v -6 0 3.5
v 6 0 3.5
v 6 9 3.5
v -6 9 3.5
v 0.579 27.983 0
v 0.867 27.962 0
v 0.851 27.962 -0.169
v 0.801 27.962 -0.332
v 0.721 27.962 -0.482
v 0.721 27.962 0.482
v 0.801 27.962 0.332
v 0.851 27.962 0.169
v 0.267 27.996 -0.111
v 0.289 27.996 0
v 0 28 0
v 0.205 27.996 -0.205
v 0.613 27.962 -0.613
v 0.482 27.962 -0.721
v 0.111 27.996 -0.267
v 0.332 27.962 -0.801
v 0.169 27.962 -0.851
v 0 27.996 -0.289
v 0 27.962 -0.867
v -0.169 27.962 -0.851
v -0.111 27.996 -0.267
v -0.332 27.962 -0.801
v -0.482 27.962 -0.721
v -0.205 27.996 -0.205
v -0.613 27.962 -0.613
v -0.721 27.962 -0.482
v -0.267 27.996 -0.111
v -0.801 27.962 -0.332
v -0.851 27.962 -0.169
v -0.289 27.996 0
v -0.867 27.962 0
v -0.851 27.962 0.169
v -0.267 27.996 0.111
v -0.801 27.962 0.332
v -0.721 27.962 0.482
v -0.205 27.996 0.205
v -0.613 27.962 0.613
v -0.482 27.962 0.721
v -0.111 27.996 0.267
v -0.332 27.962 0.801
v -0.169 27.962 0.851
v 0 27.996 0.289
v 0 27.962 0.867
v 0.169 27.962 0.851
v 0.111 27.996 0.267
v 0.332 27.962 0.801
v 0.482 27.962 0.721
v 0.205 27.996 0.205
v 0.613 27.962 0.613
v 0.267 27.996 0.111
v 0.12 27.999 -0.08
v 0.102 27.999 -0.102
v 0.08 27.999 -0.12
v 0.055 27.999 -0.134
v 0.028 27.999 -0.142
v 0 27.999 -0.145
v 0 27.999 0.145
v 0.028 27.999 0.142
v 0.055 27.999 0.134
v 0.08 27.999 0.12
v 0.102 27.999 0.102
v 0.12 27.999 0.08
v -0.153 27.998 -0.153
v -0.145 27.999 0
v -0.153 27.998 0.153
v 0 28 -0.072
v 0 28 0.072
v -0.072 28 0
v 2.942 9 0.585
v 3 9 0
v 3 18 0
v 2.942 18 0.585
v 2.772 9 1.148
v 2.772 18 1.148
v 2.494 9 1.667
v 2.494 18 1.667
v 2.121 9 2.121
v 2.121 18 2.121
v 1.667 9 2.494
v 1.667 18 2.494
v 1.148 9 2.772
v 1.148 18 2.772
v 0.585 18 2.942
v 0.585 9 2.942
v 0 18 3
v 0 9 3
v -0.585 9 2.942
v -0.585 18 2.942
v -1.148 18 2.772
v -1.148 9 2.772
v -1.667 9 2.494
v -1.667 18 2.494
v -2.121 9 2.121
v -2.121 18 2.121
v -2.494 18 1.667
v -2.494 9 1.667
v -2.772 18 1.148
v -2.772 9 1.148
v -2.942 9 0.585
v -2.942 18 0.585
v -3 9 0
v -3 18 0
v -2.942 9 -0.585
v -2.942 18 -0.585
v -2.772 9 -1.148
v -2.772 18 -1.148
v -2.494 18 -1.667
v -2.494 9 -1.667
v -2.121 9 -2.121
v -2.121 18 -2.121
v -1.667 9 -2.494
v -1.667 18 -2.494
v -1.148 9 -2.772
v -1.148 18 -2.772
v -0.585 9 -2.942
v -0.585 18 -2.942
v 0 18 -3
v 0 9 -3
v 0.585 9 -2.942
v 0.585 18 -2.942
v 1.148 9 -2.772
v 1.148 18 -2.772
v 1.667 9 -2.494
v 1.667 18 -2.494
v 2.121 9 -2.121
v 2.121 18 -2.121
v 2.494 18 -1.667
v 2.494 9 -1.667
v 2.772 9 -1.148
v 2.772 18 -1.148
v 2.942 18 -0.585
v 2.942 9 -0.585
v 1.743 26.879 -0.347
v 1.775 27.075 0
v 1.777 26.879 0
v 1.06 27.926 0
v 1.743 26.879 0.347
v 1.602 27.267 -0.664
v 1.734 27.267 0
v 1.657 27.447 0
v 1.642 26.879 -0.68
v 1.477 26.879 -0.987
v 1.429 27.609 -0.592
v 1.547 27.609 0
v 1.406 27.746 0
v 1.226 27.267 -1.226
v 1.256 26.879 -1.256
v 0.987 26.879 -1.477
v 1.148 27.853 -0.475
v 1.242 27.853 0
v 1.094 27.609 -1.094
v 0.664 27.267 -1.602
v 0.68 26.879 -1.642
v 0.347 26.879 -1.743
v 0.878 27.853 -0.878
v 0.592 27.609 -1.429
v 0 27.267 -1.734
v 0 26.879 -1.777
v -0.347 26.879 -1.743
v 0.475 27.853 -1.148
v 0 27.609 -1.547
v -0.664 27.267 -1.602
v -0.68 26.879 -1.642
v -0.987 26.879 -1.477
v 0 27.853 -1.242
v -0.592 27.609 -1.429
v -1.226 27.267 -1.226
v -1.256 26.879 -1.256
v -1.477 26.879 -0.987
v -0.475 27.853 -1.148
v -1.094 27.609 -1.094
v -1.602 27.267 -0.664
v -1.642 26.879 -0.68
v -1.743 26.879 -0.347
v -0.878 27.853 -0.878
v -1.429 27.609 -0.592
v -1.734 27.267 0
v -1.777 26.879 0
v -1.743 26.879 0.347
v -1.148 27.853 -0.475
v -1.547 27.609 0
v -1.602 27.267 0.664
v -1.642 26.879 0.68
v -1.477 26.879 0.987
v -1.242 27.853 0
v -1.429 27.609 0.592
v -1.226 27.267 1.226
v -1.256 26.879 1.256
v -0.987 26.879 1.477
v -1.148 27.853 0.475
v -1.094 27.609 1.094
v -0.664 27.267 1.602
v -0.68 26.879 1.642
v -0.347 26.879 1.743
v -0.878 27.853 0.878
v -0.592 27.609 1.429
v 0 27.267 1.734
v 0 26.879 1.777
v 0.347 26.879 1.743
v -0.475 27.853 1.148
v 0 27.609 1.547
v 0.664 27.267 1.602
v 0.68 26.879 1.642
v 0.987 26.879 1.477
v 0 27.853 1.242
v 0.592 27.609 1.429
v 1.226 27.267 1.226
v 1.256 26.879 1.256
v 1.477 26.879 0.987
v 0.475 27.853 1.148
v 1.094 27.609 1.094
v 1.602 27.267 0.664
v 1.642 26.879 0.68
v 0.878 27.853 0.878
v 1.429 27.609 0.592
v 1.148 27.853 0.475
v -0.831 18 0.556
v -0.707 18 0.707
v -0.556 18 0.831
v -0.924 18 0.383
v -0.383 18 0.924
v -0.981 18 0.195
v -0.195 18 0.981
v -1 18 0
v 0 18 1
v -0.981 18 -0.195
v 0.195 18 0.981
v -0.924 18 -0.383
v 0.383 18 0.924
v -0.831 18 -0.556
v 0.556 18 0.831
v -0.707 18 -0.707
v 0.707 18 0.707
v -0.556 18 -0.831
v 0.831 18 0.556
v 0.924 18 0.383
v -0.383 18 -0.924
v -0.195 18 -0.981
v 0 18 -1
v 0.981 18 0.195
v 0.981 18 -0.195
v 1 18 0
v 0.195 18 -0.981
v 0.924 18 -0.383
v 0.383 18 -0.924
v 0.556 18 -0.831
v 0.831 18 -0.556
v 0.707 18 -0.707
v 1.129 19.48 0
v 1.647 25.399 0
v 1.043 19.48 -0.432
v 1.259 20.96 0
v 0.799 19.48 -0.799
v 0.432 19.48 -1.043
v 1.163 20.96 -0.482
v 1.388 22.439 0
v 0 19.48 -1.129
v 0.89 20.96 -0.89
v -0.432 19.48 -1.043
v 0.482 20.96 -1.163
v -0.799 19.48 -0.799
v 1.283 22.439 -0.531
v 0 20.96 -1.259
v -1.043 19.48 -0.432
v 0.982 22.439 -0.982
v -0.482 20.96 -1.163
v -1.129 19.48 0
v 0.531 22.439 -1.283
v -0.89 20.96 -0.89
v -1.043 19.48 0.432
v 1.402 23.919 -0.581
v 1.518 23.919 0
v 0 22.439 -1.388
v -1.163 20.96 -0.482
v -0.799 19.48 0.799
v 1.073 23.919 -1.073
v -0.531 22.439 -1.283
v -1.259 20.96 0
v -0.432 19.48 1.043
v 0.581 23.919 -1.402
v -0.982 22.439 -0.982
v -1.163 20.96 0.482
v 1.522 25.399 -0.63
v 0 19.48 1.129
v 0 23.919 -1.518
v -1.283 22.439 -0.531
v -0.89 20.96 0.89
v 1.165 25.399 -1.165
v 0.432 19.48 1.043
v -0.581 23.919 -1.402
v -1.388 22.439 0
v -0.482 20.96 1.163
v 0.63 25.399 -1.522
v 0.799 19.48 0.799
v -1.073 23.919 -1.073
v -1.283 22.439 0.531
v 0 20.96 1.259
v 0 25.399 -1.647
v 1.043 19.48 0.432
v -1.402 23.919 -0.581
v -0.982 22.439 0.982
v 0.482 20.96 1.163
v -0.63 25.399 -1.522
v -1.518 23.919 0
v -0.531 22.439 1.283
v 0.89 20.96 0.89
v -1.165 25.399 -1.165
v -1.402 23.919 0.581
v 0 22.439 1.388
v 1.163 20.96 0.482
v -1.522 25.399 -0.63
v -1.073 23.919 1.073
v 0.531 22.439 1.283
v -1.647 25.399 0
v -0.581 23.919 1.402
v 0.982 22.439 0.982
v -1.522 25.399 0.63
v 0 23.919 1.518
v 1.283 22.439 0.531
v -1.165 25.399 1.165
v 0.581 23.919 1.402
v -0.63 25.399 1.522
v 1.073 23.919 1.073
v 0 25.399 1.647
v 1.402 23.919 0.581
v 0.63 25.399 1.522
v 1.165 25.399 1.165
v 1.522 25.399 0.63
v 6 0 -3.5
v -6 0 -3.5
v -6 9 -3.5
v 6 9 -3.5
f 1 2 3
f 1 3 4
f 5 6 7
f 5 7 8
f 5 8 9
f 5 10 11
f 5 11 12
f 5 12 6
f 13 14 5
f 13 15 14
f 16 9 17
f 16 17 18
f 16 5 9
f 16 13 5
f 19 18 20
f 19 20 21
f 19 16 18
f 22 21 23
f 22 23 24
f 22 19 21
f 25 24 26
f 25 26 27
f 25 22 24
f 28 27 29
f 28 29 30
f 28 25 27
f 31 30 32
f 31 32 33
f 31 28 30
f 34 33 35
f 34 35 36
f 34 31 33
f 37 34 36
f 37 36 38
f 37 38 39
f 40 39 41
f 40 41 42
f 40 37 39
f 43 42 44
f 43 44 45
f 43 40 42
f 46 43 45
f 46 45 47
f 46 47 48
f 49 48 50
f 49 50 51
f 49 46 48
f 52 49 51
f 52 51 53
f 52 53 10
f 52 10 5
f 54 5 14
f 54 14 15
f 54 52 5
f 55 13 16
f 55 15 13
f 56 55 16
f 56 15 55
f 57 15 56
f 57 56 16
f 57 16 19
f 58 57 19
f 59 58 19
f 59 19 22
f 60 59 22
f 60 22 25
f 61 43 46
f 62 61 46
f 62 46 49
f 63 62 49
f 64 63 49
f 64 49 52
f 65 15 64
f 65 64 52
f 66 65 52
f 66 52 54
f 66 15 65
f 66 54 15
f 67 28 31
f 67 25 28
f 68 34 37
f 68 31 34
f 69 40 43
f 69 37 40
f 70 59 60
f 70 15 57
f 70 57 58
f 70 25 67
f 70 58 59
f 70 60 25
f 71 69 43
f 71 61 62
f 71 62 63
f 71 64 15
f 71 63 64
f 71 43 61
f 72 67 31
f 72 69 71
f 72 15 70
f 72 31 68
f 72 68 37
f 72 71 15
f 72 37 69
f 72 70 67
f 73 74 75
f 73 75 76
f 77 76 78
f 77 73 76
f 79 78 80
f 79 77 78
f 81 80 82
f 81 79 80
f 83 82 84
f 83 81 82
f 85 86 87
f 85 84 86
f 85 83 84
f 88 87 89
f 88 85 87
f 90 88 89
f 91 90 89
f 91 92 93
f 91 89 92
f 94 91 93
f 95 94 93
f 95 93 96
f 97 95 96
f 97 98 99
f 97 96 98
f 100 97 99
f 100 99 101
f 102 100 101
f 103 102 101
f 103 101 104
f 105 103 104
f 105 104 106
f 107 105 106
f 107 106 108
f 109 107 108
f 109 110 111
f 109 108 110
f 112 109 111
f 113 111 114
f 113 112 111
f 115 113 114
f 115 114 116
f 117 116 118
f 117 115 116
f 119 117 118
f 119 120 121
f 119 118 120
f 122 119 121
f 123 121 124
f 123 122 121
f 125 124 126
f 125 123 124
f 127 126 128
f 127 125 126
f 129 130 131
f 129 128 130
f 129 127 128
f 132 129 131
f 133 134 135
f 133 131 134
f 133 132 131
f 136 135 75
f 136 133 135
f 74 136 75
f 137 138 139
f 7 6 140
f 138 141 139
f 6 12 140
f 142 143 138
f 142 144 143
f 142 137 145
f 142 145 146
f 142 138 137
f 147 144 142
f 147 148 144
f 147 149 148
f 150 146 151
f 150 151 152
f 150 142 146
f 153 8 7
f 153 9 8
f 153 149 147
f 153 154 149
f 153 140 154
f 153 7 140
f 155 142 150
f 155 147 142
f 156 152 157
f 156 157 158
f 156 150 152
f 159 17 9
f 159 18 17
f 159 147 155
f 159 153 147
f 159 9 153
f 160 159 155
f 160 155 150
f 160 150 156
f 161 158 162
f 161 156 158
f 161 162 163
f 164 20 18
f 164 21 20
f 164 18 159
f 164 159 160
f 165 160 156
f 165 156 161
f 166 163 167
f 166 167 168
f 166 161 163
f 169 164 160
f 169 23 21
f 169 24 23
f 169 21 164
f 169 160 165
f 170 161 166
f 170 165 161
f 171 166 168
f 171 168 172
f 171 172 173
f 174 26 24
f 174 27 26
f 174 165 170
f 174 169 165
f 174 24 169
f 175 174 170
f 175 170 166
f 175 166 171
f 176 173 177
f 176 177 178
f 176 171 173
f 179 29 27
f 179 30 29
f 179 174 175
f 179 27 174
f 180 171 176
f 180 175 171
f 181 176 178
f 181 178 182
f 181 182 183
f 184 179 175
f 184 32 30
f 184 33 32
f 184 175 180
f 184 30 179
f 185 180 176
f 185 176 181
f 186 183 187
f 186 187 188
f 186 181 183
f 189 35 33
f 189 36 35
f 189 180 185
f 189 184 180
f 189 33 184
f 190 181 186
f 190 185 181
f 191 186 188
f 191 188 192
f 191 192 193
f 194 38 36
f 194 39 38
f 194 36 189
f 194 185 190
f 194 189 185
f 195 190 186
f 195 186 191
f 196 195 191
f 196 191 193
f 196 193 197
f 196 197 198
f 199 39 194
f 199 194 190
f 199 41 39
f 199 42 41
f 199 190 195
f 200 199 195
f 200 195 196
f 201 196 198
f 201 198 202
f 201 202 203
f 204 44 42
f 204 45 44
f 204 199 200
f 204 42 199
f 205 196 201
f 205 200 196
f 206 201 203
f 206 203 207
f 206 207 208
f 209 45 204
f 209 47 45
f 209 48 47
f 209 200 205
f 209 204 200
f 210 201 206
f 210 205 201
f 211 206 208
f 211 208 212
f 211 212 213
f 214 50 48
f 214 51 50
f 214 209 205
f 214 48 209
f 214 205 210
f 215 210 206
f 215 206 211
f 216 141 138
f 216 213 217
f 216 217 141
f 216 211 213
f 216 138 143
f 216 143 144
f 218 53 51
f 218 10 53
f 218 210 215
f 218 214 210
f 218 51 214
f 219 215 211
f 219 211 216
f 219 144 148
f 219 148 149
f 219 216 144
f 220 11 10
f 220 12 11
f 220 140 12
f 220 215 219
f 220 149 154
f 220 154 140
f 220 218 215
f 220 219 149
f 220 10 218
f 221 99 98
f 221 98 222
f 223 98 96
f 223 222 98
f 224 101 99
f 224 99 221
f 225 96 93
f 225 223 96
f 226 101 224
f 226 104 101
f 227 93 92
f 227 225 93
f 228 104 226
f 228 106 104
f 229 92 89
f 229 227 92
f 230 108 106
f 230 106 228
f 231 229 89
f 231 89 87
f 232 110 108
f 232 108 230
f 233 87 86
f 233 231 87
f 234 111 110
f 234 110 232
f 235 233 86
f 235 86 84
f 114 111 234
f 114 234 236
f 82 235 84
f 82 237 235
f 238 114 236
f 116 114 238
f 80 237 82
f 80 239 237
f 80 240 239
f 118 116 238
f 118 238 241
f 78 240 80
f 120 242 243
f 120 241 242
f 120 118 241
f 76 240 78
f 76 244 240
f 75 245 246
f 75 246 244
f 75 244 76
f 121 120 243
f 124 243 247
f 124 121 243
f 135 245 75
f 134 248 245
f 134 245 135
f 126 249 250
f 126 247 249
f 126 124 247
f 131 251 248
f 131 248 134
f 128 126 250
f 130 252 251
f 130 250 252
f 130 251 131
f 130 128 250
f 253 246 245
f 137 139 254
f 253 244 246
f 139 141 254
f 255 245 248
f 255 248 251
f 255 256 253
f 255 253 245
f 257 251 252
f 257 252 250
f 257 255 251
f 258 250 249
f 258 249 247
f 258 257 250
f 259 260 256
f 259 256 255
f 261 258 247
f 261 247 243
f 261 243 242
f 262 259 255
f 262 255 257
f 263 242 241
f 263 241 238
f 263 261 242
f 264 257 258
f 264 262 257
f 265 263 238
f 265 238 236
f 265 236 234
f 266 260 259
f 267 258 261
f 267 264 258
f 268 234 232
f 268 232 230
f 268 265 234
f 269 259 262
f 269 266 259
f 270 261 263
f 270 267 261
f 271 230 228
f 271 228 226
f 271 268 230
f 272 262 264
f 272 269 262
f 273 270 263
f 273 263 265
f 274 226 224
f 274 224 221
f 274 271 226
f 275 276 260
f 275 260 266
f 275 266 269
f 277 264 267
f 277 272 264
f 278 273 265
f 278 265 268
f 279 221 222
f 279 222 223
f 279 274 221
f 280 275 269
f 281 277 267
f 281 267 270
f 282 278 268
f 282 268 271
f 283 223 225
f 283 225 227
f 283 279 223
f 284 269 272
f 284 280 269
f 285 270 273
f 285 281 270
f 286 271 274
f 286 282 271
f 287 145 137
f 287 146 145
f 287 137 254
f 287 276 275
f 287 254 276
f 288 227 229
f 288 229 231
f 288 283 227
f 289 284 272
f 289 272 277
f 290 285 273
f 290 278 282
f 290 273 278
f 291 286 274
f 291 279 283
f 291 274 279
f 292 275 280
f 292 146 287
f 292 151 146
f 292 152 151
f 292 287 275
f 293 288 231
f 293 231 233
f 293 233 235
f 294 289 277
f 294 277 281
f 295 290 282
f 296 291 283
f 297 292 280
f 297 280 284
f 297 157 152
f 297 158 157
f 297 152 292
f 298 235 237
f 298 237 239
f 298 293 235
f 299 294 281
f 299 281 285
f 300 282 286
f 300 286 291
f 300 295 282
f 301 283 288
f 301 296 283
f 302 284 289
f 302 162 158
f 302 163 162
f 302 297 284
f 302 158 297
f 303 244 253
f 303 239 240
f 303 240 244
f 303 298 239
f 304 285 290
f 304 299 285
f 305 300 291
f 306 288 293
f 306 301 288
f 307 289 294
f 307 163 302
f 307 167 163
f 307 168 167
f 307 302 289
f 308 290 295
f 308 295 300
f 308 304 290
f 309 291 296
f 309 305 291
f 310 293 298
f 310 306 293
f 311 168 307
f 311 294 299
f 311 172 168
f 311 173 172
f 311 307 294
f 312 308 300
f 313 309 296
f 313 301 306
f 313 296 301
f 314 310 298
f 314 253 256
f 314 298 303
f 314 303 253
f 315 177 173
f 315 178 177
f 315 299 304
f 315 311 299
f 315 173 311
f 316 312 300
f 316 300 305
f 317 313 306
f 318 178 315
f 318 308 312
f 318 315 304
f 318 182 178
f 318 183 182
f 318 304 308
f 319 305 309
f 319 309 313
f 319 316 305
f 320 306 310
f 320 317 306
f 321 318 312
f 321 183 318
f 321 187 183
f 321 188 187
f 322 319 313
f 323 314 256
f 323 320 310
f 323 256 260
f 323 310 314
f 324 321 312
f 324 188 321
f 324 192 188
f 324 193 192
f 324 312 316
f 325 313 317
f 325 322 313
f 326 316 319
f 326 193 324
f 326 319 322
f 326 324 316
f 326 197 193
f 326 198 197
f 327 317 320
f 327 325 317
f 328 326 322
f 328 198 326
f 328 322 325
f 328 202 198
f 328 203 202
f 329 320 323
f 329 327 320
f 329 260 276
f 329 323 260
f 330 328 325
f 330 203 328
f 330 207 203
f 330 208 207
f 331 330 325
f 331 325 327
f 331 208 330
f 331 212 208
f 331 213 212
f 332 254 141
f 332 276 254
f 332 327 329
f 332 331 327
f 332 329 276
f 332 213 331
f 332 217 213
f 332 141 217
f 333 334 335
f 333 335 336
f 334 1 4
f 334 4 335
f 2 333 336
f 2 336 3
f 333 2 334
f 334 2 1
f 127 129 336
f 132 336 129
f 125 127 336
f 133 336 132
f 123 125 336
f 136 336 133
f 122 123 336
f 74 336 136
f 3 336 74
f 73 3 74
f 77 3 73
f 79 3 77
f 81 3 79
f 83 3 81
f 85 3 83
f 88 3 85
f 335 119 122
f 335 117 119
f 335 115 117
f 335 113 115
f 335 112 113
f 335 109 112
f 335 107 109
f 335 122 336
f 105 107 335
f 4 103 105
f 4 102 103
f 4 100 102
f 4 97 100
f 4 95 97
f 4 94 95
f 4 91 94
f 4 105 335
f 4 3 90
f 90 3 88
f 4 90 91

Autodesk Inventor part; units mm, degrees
ref_plane "YZ Plane" through (0, 0, 0) normal (1, 0, 0) x (0, 1, 0)
ref_plane "XZ Plane" through (0, 0, 0) normal (0, 1, 0) x (-1, 0, 0)
ref_plane "XY Plane" through (0, 0, 0) normal (0, 0, 1) x (1, 0, 0)
sketch "Sketch1" plane through (0, 0, 0) normal (0, 1, 0) x (-1, 0, 0)
  line L0 (6, -3.5) -> (-6, -3.5)
  line L1 (-6, -3.5) -> (-6, 3.5)
  line L2 (-6, 3.5) -> (6, 3.5)
  line L3 (6, 3.5) -> (6, -3.5)
  line L4 (6, -3.5) -> (-6, 3.5) construction
  line L5 (-6, -3.5) -> (6, 3.5) construction
  point P0 (0, 0)
  dimension "d0" = 12
  dimension "d1" = 7
extrude "Extrusion1" add sketch "Sketch1" along normal blind 9
sketch "Sketch2" plane through (0, 9, 0) normal (0, 1, 0) x (1, 0, 0)
  circle A0 centre (0, 0) radius 3
  dimension "d4" = 6
extrude "Extrusion2" add sketch "Sketch2" along normal blind 9
sketch "Sketch5" plane through (0, 0, 0) normal (0, 0, 1) x (1, 0, 0)
  line L0 (3, 18) -> (-3, 18) construction
  line L1 (-3, 9) -> (3, 9) construction
  line L2 (0, 18) -> (0, 28)
  line L3 (0, 18) -> (1, 18)
  line L4 (1, 18) -> (1.7768, 26.8789)
  arc A0 (0.8673, 27.9623) -> (0, 28) centre (0, 18) ccw
  arc A1 (0, 28) -> (1.8596, 27.8256) centre (0, 18) ccw construction
  arc A2 (1.7768, 26.8789) -> (0.8673, 27.9623) centre (0.7806, 26.9661) ccw
  point P0 (0, 0)
  dimension "d7" = 10
  dimension "d8" = 1
  dimension "d9" = 85
  dimension "d10" = 1
revolve "Revolution1" add sketch "Sketch5" angle 360 about axis through (0, 18, 0) along (0, 1, 0)
thread "Thread1" size "M6x1" class "6g" standard "ANSI Metric M Profile" full length
properties part number "Switch"
